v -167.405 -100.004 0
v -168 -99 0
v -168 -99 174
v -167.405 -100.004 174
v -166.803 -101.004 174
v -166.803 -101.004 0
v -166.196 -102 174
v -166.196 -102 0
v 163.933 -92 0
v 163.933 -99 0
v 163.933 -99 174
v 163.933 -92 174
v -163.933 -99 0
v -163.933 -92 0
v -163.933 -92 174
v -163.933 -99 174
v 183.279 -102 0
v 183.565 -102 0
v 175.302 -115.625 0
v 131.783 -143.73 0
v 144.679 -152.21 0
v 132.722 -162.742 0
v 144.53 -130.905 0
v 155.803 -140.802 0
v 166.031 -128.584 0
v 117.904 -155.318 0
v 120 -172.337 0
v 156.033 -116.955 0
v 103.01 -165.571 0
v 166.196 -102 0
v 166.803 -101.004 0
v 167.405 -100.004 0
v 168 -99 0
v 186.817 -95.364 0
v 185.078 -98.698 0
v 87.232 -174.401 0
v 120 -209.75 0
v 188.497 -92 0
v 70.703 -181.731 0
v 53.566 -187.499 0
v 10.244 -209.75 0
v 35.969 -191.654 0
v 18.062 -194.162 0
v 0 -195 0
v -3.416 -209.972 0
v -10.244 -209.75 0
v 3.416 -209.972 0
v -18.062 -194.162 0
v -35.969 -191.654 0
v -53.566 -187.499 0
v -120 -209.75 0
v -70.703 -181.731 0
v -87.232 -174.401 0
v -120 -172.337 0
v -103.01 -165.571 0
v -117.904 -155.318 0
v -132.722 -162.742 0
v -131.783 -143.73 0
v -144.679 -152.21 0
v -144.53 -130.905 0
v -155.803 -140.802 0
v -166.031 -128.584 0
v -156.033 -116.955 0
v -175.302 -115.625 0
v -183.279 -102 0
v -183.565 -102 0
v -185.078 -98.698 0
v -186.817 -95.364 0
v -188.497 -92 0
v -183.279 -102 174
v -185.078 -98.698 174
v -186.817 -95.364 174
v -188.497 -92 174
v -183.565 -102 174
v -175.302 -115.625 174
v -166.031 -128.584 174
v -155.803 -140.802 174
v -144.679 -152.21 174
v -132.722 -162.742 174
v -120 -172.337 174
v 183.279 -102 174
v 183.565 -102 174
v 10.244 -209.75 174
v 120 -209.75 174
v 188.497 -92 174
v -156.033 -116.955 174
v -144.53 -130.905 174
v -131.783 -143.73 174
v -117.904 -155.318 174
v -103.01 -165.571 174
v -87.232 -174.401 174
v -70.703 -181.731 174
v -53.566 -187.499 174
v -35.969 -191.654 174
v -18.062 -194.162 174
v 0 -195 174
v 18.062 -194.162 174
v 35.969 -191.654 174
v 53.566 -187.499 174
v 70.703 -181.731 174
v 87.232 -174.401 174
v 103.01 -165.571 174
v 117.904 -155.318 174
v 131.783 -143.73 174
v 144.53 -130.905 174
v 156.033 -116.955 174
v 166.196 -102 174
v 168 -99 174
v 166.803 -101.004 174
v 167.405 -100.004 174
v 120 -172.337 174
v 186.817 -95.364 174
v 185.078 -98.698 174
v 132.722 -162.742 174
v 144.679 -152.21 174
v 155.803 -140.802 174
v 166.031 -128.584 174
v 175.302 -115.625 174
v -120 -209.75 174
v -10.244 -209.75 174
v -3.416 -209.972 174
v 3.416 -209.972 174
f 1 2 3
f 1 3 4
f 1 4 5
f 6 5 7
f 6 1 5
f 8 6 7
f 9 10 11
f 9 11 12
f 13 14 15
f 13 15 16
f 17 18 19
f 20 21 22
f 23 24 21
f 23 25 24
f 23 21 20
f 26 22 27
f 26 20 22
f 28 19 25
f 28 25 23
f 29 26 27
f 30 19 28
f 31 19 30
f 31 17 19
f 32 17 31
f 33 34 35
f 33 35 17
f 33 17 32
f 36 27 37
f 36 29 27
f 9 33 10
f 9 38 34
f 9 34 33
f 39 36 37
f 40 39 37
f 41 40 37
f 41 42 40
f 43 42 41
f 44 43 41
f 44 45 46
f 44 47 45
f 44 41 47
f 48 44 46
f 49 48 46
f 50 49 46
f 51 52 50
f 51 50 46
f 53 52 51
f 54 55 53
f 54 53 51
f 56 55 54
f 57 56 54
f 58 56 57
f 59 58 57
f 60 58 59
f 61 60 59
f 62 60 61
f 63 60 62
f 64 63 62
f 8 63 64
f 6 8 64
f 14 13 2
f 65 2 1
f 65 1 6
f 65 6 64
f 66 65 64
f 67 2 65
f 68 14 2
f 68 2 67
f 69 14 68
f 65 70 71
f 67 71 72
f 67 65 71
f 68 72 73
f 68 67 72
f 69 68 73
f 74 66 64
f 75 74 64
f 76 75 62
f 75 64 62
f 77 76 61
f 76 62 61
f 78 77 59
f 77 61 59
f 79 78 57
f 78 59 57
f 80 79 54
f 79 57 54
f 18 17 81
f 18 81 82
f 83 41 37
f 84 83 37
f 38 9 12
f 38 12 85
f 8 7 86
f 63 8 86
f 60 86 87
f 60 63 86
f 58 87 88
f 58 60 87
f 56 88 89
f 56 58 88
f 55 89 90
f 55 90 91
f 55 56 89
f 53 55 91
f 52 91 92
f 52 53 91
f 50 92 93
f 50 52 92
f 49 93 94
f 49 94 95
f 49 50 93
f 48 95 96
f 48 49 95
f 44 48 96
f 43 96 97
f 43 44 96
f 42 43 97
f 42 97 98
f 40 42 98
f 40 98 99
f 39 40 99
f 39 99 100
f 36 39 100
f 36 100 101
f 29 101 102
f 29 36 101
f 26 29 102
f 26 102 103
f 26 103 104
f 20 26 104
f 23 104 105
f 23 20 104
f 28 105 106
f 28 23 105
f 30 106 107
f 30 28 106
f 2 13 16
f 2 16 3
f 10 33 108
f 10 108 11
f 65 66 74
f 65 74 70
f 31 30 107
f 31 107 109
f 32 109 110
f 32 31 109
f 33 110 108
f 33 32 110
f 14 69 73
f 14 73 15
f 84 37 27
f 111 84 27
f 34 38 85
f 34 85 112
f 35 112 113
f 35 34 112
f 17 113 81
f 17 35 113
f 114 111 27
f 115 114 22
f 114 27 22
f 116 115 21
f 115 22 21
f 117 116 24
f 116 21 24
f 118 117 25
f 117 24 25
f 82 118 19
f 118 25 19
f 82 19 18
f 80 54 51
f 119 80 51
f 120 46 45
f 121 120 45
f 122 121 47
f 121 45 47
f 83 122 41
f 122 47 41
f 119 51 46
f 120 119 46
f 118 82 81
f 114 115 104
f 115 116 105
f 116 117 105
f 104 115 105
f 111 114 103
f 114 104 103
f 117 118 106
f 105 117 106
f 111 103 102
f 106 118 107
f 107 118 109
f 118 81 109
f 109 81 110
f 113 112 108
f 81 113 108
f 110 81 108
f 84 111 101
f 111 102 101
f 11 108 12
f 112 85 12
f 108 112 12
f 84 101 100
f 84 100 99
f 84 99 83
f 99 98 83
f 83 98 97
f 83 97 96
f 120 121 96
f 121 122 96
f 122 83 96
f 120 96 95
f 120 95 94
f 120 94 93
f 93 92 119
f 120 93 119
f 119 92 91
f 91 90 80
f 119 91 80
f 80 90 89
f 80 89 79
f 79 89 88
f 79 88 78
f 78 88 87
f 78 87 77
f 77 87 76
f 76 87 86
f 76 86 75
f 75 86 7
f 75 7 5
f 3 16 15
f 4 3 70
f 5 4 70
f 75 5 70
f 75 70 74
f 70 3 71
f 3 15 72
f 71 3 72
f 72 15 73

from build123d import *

# Parameters (mm, degrees)
SKETCH_1_R          = 210
SKETCH_1_R_2        = 203
EXTRUDE_2_DEPTH     = 174
EXTRUDE_START       = -174
EXTRUDE_4_DEPTH     = 174
CUT_EXTRUDE_1_DEPTH = 654
EXTRUDE_5_DEPTH     = 174
EXTRUDE_6_DEPTH     = 174
EXTRUDE_7_DEPTH     = 174
EXTRUDE_8_DEPTH     = 174


with BuildPart() as part:
    # 草图1 → 凸台-拉伸2 (new body)
    with BuildSketch(Plane.XY):
        Circle(SKETCH_1_R)
        Circle(SKETCH_1_R_2, mode=Mode.SUBTRACT)
    extrude(amount=EXTRUDE_2_DEPTH)

    # 草图2 → 凸台-拉伸4 (add)
    with BuildSketch(Plane.XY.offset(174).offset(EXTRUDE_START)):
        with BuildLine():
            Line((-170.735431044, -102), (-173.735431044, -102))
            Line((-173.735431044, -102), (-175.513532242, -102))
            ThreePointArc((-175.513532242, -102), (-174.63092392, -103.50381834), (-173.735431044, -105))
            Line((-173.735431044, -105), (-170.735431044, -105))
            Line((-170.735431044, -105), (-170.735431044, -102))
        make_face()
        with BuildLine():
            ThreePointArc((173.735431044, -105), (174.63092392, -103.50381834), (175.513532242, -102))
            Line((175.513532242, -102), (173.735431044, -102))
            Line((173.735431044, -102), (170.735431044, -102))
            Line((170.735431044, -102), (170.735431044, -105))
            Line((170.735431044, -105), (173.735431044, -105))
        make_face()
    extrude(amount=EXTRUDE_4_DEPTH)

    # 草图3 → 切除-拉伸1 (cut)
    with BuildSketch(Plane.XY.offset(174)):
        Polygon((-170.735431044, -102), (238.333646515, -102), (254.334169784, 272.292523591), (-334.569415043, 221.85110305), (-306.830562533, -102), align=None)
    extrude(amount=-CUT_EXTRUDE_1_DEPTH, mode=Mode.SUBTRACT)

    # 草图5 → 凸台-拉伸5 (add)
    with BuildSketch(Plane.XY.offset(174).offset(EXTRUDE_START)):
        with BuildLine():
            Line((-120, -209.75), (-10.243900624, -209.75))
            ThreePointArc((-10.243900624, -209.75), (-67.755470707, -198.769203322), (-120, -172.336879396))
            Line((-120, -172.336879396), (-120, -209.75))
        make_face()
        with BuildLine():
            ThreePointArc((120, -172.336879396), (67.755470707, -198.769203322), (10.243900624, -209.75))
            Line((10.243900624, -209.75), (120, -209.75))
            Line((120, -209.75), (120, -172.336879396))
        make_face()
    extrude(amount=EXTRUDE_5_DEPTH)

    # 草图6 → 凸台-拉伸6 (add)
    with BuildSketch(Plane.XY.offset(174).offset(EXTRUDE_START)):
        with BuildLine():
            Line((-175.513532242, -102), (-166.195667814, -102))
            ThreePointArc((-166.195667814, -102), (0, -195), (166.195667814, -102))
            Line((166.195667814, -102), (175.513532242, -102))
            ThreePointArc((175.513532242, -102), (0, -203), (-175.513532242, -102))
        make_face()
    extrude(amount=EXTRUDE_6_DEPTH)

    # 草图7 → 凸台-拉伸7 (add)
    with BuildSketch(Plane.XY.offset(174).offset(EXTRUDE_START)):
        with BuildLine():
            Line((-166.933126535, -92), (-166.933126535, -95))
            Line((-166.933126535, -95), (-170.293863659, -95))
            ThreePointArc((-170.293863659, -95), (0, -195), (170.293863659, -95))
            Line((170.293863659, -95), (166.933126535, -95))
            Line((166.933126535, -95), (166.933126535, -92))
            Line((166.933126535, -92), (171.933126535, -92))
            Line((171.933126535, -92), (188.496850106, -92))
            ThreePointArc((188.496850106, -92), (0, -209.75), (-188.496850106, -92))
            Line((-188.496850106, -92), (-171.933126535, -92))
            Line((-171.933126535, -92), (-166.933126535, -92))
        make_face()
    extrude(amount=EXTRUDE_7_DEPTH)

    # 草图8 → 凸台-拉伸8 (add)
    with BuildSketch(Plane(origin=(0, 0, 0), x_dir=(-1, 0, 0), z_dir=(0, 0, -1))):
        with BuildLine():
            Line((166.933126535, -92), (163.933126535, -92))
            Line((163.933126535, -92), (163.933126535, -99))
            Line((163.933126535, -99), (168, -99))
            ThreePointArc((168, -99), (169.158755456, -97.006780447), (170.293863659, -95))
            Line((170.293863659, -95), (166.933126535, -95))
            Line((166.933126535, -95), (166.933126535, -92))
        make_face()
        with BuildLine():
            Line((-166.933126535, -95), (-170.293863659, -95))
            ThreePointArc((-170.293863659, -95), (-169.158755456, -97.006780447), (-168, -99))
            Line((-168, -99), (-163.933126535, -99))
            Line((-163.933126535, -99), (-163.933126535, -92))
            Line((-163.933126535, -92), (-166.933126535, -92))
            Line((-166.933126535, -92), (-166.933126535, -95))
        make_face()
    extrude(amount=-EXTRUDE_8_DEPTH)


solid = part.part
